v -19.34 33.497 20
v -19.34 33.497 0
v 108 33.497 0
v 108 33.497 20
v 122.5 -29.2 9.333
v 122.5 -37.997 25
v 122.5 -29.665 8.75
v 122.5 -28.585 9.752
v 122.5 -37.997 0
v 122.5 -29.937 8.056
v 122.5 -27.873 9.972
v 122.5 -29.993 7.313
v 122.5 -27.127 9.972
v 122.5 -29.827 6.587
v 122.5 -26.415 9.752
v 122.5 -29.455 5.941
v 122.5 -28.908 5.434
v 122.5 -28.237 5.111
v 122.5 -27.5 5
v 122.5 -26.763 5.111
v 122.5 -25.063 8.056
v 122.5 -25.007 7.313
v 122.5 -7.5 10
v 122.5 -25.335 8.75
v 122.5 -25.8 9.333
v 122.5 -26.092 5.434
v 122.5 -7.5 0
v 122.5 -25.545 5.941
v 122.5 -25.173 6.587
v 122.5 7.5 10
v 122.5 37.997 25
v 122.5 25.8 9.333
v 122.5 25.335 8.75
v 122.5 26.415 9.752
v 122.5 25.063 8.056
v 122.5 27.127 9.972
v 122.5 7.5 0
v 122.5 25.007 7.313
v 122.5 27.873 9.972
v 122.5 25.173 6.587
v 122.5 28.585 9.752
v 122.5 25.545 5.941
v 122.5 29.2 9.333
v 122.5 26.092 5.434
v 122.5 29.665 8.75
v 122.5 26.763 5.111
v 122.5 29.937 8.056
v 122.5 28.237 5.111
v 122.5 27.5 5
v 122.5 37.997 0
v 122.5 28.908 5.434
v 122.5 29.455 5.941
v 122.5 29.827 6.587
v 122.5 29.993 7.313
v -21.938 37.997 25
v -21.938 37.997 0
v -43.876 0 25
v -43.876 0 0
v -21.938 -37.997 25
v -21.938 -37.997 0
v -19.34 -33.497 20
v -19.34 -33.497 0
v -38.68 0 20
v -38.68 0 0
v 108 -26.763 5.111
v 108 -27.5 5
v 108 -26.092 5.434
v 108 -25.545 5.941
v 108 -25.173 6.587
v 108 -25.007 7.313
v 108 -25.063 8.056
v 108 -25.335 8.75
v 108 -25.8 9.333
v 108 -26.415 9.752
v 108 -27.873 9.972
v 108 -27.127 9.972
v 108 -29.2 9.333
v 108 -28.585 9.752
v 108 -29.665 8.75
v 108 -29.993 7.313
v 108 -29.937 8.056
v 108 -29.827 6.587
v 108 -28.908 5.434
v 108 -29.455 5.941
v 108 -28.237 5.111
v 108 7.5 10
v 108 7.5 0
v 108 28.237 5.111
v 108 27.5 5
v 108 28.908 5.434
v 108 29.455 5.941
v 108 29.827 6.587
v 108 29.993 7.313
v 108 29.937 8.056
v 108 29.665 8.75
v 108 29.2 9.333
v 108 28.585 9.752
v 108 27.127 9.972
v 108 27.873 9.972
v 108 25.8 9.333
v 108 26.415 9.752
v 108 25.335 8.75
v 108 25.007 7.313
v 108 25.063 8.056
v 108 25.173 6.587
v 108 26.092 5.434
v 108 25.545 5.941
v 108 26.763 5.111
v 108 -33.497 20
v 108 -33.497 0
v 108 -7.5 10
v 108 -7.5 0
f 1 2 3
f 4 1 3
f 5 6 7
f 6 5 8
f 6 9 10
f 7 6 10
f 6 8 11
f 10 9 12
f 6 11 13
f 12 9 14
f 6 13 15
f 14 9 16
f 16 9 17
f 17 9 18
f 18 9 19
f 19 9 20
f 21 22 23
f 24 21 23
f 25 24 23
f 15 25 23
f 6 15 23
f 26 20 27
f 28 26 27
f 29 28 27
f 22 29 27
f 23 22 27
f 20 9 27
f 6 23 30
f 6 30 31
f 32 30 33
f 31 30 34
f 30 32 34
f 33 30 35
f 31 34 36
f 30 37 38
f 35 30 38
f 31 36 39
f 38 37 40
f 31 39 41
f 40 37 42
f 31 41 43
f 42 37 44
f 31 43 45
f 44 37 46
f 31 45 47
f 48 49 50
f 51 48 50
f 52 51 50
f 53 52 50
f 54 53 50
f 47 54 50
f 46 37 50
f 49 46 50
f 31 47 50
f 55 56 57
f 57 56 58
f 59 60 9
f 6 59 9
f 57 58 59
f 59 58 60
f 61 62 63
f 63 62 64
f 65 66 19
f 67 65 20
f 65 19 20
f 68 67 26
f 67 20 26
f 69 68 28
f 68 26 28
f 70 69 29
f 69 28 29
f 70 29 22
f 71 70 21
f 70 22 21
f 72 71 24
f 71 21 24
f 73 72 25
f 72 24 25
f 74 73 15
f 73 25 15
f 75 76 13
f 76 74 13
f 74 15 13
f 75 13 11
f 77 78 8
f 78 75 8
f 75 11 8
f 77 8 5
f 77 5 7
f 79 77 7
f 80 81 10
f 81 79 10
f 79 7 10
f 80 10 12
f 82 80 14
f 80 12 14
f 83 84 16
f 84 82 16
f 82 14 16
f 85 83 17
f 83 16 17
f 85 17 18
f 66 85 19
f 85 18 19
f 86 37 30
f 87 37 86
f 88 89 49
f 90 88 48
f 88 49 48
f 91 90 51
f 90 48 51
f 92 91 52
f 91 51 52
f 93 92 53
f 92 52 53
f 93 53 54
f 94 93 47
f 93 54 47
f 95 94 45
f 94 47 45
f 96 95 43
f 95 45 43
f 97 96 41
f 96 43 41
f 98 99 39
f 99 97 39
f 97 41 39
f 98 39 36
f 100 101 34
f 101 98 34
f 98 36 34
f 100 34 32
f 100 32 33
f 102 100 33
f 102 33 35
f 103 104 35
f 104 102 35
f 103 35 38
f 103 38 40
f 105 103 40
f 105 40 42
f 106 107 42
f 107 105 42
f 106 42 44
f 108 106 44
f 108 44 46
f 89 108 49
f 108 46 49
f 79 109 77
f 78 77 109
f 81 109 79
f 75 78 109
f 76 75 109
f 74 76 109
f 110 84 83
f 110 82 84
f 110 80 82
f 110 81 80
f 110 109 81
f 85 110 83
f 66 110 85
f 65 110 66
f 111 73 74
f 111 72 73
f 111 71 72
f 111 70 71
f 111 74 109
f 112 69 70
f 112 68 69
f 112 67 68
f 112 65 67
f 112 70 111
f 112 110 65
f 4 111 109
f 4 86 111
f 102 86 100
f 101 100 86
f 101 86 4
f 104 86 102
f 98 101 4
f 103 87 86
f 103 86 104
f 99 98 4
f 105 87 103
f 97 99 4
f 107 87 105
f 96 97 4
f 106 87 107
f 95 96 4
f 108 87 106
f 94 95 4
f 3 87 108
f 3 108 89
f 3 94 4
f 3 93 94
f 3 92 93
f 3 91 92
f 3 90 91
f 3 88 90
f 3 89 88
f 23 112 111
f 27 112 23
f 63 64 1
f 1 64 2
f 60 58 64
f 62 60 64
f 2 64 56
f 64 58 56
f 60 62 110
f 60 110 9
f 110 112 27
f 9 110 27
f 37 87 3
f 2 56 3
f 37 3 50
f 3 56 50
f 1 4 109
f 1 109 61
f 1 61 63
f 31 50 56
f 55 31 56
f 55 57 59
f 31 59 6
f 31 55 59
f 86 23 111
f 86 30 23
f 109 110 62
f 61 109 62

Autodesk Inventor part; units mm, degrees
ref_plane "YZ Plane" through (0, 0, 0) normal (1, 0, 0) x (0, 1, 0)
ref_plane "XZ Plane" through (0, 0, 0) normal (0, 1, 0) x (-1, 0, 0)
ref_plane "XY Plane" through (0, 0, 0) normal (0, 0, 1) x (1, 0, 0)
sketch "Sketch1" plane through (0, 0, 0) normal (0, 0, 1) x (1, 0, 0)
  line L0 (44.453, 0) -> (22.2265, -38.4974)
  line L1 (22.2265, -38.4974) -> (-22.2265, -38.4974)
  line L2 (-22.2265, -38.4974) -> (-44.453, 0)
  line L3 (-44.453, 0) -> (-22.2265, 38.4974)
  line L4 (-22.2265, 38.4974) -> (22.2265, 38.4974)
  line L5 (22.2265, 38.4974) -> (44.453, 0)
  line L6 (22.2265, 38.4974) -> (123, 38.4974)
  line L7 (22.2265, -38.4974) -> (123, -38.4974)
  line L8 (123, -38.4974) -> (123, 38.4974)
  point P0 (0, 0)
  point P1 (0, 0)
  dimension "d1" = 145.2265
  dimension "d2" = 76.9948
extrude "Extrusion1" add sketch "Sketch1" along normal blind 15
sketch "Sketch2" plane through (123, -38.4974, 0) normal (1, 0, 0) x (0, 0, -1)
  circle A0 centre (-7.5, 65.9974) radius 2.5
  circle A1 centre (-7.5, 10.9974) radius 2.5
  line L0 (-7.5, 65.9974) -> (-7.5, 10.9974) construction
  line L1 (0, 0) -> (0, 76.9948) construction
  line L2 (0, 76.9948) -> (-15, 76.9948) construction
  point P0 (0, 38.4974)
  point P1 (-7.5, 38.4974)
  point P2 (0, 38.4974)
  point P3 (-7.5, 76.9948)
  dimension "d5" = 5
  dimension "d6" = 5
  dimension "d7" = 55
extrude "Extrusion2" cut sketch "Sketch2" against normal blind 25
sketch "Sketch3" plane through (0, 0, 0) normal (0, 0, -1) x (-1, 0, 0)
  line L0 (-123, -38.4974) -> (-123, 38.4974) projected
  line L1 (-123, 7.5) -> (-108, 7.5)
  line L2 (-108, 7.5) -> (-108, -7.5)
  line L3 (-108, -7.5) -> (-123, -7.5)
  line L4 (-123, -7.5) -> (-123, 7.5)
  line L5 (-123, 38.4974) -> (22.2265, 38.4974) projected
  line L6 (22.2265, 38.4974) -> (44.453, 0) projected
  line L7 (44.453, 0) -> (22.2265, -38.4974) projected
  line L8 (22.2265, -38.4974) -> (-123, -38.4974) projected
  line L9 (38.6795, 0) -> (19.3397, 33.4974)
  line L10 (19.3397, 33.4974) -> (-118, 33.4974)
  line L11 (-118, 33.4974) -> (-118, -33.4974) construction
  line L12 (-118, -33.4974) -> (19.3397, -33.4974)
  line L13 (19.3397, -33.4974) -> (38.6795, 0)
  line L14 (-108, 7.5) -> (-108, 33.4974)
  line L15 (-108, -7.5) -> (-108, -33.4974)
  line L16 (19.3397, 33.4974) -> (-108, 33.4974)
  line L17 (-108, -33.4974) -> (19.3397, -33.4974)
  point P0 (0, 0)
  point P1 (-123, 0)
  dimension "d10" = 15
  dimension "d11" = 15
  dimension "d12" = 5
extrude "Extrusion3" cut sketch "Sketch3" against normal blind 10 contours L0 L1 L2 L3 | L2 L14 L10 L9 L13 L12 L15
sketch "Sketch5" plane through (0, 0, 15) normal (0, 0, 1) x (1, 0, 0)
  line L0 (123, 38.4974) -> (-22.2265, 38.4974) projected
  line L1 (-22.2265, 38.4974) -> (-44.453, 0) projected
  line L2 (-44.453, 0) -> (-22.2265, -38.4974) projected
  line L3 (-22.2265, -38.4974) -> (123, -38.4974) projected
  line L4 (123, -38.4974) -> (123, 38.4974) projected
  line L5 (122.5, -37.9974) -> (-21.9378, -37.9974)
  line L6 (-21.9378, -37.9974) -> (-43.8756, 0)
  line L7 (-43.8756, 0) -> (-21.9378, 37.9974)
  line L8 (-21.9378, 37.9974) -> (122.5, 37.9974)
  line L9 (122.5, 37.9974) -> (122.5, -37.9974)
  point P0 (0, 0)
  dimension "d15" = 0.5
extrude "Extrusion4" cut sketch "Sketch5" against normal through all
sketch "Sketch6" plane through (0, 0, 15) normal (0, 0, 1) x (1, 0, 0)
  line L0 (122.5, -37.9974) -> (122.5, 37.9974) projected
  line L1 (122.5, 37.9974) -> (-21.9378, 37.9974) projected
  line L2 (-21.9378, 37.9974) -> (-43.8756, 0) projected
  line L3 (-43.8756, 0) -> (-21.9378, -37.9974) projected
  line L4 (-21.9378, -37.9974) -> (122.5, -37.9974) projected
  point P0 (0, 0)
extrude "Extrusion5" add sketch "Sketch6" along normal blind 10
sketch "Sketch7" plane through (0, 0, 10) normal (0, 0, -1) x (-1, 0, 0)
  line L0 (-122.5, 7.5) -> (-122.5, -7.5) projected
  line L1 (-108, -7.5) -> (-122.5, -7.5) projected
  line L2 (-108, -27.5) -> (-108, -7.5) projected
  line L3 (-108, -33.4974) -> (-108, -27.5) projected
  line L4 (19.3397, -33.4974) -> (-108, -33.4974) projected
  line L5 (38.6795, 0) -> (19.3397, -33.4974) projected
  line L6 (19.3397, 33.4974) -> (38.6795, 0) projected
  line L7 (-108, 33.4974) -> (19.3397, 33.4974) projected
  line L8 (-108, 27.5) -> (-108, 33.4974) projected
  line L9 (-108, 7.5) -> (-108, 27.5) projected
  line L10 (-122.5, 7.5) -> (-108, 7.5) projected
  line L11 (-108, 7.5) -> (-108, 27.5) projected
  line L12 (-108, -27.5) -> (-108, -7.5) projected
  line L13 (-108, 7.5) -> (-108, -7.5)
  point P0 (0, 0)
extrude "Extrusion6" cut sketch "Sketch7" against normal blind 10 contours L9 L8 L7 L6 L5 L4 L3 L2 L13
properties part number "TARM06" material "ABS Plastic"
